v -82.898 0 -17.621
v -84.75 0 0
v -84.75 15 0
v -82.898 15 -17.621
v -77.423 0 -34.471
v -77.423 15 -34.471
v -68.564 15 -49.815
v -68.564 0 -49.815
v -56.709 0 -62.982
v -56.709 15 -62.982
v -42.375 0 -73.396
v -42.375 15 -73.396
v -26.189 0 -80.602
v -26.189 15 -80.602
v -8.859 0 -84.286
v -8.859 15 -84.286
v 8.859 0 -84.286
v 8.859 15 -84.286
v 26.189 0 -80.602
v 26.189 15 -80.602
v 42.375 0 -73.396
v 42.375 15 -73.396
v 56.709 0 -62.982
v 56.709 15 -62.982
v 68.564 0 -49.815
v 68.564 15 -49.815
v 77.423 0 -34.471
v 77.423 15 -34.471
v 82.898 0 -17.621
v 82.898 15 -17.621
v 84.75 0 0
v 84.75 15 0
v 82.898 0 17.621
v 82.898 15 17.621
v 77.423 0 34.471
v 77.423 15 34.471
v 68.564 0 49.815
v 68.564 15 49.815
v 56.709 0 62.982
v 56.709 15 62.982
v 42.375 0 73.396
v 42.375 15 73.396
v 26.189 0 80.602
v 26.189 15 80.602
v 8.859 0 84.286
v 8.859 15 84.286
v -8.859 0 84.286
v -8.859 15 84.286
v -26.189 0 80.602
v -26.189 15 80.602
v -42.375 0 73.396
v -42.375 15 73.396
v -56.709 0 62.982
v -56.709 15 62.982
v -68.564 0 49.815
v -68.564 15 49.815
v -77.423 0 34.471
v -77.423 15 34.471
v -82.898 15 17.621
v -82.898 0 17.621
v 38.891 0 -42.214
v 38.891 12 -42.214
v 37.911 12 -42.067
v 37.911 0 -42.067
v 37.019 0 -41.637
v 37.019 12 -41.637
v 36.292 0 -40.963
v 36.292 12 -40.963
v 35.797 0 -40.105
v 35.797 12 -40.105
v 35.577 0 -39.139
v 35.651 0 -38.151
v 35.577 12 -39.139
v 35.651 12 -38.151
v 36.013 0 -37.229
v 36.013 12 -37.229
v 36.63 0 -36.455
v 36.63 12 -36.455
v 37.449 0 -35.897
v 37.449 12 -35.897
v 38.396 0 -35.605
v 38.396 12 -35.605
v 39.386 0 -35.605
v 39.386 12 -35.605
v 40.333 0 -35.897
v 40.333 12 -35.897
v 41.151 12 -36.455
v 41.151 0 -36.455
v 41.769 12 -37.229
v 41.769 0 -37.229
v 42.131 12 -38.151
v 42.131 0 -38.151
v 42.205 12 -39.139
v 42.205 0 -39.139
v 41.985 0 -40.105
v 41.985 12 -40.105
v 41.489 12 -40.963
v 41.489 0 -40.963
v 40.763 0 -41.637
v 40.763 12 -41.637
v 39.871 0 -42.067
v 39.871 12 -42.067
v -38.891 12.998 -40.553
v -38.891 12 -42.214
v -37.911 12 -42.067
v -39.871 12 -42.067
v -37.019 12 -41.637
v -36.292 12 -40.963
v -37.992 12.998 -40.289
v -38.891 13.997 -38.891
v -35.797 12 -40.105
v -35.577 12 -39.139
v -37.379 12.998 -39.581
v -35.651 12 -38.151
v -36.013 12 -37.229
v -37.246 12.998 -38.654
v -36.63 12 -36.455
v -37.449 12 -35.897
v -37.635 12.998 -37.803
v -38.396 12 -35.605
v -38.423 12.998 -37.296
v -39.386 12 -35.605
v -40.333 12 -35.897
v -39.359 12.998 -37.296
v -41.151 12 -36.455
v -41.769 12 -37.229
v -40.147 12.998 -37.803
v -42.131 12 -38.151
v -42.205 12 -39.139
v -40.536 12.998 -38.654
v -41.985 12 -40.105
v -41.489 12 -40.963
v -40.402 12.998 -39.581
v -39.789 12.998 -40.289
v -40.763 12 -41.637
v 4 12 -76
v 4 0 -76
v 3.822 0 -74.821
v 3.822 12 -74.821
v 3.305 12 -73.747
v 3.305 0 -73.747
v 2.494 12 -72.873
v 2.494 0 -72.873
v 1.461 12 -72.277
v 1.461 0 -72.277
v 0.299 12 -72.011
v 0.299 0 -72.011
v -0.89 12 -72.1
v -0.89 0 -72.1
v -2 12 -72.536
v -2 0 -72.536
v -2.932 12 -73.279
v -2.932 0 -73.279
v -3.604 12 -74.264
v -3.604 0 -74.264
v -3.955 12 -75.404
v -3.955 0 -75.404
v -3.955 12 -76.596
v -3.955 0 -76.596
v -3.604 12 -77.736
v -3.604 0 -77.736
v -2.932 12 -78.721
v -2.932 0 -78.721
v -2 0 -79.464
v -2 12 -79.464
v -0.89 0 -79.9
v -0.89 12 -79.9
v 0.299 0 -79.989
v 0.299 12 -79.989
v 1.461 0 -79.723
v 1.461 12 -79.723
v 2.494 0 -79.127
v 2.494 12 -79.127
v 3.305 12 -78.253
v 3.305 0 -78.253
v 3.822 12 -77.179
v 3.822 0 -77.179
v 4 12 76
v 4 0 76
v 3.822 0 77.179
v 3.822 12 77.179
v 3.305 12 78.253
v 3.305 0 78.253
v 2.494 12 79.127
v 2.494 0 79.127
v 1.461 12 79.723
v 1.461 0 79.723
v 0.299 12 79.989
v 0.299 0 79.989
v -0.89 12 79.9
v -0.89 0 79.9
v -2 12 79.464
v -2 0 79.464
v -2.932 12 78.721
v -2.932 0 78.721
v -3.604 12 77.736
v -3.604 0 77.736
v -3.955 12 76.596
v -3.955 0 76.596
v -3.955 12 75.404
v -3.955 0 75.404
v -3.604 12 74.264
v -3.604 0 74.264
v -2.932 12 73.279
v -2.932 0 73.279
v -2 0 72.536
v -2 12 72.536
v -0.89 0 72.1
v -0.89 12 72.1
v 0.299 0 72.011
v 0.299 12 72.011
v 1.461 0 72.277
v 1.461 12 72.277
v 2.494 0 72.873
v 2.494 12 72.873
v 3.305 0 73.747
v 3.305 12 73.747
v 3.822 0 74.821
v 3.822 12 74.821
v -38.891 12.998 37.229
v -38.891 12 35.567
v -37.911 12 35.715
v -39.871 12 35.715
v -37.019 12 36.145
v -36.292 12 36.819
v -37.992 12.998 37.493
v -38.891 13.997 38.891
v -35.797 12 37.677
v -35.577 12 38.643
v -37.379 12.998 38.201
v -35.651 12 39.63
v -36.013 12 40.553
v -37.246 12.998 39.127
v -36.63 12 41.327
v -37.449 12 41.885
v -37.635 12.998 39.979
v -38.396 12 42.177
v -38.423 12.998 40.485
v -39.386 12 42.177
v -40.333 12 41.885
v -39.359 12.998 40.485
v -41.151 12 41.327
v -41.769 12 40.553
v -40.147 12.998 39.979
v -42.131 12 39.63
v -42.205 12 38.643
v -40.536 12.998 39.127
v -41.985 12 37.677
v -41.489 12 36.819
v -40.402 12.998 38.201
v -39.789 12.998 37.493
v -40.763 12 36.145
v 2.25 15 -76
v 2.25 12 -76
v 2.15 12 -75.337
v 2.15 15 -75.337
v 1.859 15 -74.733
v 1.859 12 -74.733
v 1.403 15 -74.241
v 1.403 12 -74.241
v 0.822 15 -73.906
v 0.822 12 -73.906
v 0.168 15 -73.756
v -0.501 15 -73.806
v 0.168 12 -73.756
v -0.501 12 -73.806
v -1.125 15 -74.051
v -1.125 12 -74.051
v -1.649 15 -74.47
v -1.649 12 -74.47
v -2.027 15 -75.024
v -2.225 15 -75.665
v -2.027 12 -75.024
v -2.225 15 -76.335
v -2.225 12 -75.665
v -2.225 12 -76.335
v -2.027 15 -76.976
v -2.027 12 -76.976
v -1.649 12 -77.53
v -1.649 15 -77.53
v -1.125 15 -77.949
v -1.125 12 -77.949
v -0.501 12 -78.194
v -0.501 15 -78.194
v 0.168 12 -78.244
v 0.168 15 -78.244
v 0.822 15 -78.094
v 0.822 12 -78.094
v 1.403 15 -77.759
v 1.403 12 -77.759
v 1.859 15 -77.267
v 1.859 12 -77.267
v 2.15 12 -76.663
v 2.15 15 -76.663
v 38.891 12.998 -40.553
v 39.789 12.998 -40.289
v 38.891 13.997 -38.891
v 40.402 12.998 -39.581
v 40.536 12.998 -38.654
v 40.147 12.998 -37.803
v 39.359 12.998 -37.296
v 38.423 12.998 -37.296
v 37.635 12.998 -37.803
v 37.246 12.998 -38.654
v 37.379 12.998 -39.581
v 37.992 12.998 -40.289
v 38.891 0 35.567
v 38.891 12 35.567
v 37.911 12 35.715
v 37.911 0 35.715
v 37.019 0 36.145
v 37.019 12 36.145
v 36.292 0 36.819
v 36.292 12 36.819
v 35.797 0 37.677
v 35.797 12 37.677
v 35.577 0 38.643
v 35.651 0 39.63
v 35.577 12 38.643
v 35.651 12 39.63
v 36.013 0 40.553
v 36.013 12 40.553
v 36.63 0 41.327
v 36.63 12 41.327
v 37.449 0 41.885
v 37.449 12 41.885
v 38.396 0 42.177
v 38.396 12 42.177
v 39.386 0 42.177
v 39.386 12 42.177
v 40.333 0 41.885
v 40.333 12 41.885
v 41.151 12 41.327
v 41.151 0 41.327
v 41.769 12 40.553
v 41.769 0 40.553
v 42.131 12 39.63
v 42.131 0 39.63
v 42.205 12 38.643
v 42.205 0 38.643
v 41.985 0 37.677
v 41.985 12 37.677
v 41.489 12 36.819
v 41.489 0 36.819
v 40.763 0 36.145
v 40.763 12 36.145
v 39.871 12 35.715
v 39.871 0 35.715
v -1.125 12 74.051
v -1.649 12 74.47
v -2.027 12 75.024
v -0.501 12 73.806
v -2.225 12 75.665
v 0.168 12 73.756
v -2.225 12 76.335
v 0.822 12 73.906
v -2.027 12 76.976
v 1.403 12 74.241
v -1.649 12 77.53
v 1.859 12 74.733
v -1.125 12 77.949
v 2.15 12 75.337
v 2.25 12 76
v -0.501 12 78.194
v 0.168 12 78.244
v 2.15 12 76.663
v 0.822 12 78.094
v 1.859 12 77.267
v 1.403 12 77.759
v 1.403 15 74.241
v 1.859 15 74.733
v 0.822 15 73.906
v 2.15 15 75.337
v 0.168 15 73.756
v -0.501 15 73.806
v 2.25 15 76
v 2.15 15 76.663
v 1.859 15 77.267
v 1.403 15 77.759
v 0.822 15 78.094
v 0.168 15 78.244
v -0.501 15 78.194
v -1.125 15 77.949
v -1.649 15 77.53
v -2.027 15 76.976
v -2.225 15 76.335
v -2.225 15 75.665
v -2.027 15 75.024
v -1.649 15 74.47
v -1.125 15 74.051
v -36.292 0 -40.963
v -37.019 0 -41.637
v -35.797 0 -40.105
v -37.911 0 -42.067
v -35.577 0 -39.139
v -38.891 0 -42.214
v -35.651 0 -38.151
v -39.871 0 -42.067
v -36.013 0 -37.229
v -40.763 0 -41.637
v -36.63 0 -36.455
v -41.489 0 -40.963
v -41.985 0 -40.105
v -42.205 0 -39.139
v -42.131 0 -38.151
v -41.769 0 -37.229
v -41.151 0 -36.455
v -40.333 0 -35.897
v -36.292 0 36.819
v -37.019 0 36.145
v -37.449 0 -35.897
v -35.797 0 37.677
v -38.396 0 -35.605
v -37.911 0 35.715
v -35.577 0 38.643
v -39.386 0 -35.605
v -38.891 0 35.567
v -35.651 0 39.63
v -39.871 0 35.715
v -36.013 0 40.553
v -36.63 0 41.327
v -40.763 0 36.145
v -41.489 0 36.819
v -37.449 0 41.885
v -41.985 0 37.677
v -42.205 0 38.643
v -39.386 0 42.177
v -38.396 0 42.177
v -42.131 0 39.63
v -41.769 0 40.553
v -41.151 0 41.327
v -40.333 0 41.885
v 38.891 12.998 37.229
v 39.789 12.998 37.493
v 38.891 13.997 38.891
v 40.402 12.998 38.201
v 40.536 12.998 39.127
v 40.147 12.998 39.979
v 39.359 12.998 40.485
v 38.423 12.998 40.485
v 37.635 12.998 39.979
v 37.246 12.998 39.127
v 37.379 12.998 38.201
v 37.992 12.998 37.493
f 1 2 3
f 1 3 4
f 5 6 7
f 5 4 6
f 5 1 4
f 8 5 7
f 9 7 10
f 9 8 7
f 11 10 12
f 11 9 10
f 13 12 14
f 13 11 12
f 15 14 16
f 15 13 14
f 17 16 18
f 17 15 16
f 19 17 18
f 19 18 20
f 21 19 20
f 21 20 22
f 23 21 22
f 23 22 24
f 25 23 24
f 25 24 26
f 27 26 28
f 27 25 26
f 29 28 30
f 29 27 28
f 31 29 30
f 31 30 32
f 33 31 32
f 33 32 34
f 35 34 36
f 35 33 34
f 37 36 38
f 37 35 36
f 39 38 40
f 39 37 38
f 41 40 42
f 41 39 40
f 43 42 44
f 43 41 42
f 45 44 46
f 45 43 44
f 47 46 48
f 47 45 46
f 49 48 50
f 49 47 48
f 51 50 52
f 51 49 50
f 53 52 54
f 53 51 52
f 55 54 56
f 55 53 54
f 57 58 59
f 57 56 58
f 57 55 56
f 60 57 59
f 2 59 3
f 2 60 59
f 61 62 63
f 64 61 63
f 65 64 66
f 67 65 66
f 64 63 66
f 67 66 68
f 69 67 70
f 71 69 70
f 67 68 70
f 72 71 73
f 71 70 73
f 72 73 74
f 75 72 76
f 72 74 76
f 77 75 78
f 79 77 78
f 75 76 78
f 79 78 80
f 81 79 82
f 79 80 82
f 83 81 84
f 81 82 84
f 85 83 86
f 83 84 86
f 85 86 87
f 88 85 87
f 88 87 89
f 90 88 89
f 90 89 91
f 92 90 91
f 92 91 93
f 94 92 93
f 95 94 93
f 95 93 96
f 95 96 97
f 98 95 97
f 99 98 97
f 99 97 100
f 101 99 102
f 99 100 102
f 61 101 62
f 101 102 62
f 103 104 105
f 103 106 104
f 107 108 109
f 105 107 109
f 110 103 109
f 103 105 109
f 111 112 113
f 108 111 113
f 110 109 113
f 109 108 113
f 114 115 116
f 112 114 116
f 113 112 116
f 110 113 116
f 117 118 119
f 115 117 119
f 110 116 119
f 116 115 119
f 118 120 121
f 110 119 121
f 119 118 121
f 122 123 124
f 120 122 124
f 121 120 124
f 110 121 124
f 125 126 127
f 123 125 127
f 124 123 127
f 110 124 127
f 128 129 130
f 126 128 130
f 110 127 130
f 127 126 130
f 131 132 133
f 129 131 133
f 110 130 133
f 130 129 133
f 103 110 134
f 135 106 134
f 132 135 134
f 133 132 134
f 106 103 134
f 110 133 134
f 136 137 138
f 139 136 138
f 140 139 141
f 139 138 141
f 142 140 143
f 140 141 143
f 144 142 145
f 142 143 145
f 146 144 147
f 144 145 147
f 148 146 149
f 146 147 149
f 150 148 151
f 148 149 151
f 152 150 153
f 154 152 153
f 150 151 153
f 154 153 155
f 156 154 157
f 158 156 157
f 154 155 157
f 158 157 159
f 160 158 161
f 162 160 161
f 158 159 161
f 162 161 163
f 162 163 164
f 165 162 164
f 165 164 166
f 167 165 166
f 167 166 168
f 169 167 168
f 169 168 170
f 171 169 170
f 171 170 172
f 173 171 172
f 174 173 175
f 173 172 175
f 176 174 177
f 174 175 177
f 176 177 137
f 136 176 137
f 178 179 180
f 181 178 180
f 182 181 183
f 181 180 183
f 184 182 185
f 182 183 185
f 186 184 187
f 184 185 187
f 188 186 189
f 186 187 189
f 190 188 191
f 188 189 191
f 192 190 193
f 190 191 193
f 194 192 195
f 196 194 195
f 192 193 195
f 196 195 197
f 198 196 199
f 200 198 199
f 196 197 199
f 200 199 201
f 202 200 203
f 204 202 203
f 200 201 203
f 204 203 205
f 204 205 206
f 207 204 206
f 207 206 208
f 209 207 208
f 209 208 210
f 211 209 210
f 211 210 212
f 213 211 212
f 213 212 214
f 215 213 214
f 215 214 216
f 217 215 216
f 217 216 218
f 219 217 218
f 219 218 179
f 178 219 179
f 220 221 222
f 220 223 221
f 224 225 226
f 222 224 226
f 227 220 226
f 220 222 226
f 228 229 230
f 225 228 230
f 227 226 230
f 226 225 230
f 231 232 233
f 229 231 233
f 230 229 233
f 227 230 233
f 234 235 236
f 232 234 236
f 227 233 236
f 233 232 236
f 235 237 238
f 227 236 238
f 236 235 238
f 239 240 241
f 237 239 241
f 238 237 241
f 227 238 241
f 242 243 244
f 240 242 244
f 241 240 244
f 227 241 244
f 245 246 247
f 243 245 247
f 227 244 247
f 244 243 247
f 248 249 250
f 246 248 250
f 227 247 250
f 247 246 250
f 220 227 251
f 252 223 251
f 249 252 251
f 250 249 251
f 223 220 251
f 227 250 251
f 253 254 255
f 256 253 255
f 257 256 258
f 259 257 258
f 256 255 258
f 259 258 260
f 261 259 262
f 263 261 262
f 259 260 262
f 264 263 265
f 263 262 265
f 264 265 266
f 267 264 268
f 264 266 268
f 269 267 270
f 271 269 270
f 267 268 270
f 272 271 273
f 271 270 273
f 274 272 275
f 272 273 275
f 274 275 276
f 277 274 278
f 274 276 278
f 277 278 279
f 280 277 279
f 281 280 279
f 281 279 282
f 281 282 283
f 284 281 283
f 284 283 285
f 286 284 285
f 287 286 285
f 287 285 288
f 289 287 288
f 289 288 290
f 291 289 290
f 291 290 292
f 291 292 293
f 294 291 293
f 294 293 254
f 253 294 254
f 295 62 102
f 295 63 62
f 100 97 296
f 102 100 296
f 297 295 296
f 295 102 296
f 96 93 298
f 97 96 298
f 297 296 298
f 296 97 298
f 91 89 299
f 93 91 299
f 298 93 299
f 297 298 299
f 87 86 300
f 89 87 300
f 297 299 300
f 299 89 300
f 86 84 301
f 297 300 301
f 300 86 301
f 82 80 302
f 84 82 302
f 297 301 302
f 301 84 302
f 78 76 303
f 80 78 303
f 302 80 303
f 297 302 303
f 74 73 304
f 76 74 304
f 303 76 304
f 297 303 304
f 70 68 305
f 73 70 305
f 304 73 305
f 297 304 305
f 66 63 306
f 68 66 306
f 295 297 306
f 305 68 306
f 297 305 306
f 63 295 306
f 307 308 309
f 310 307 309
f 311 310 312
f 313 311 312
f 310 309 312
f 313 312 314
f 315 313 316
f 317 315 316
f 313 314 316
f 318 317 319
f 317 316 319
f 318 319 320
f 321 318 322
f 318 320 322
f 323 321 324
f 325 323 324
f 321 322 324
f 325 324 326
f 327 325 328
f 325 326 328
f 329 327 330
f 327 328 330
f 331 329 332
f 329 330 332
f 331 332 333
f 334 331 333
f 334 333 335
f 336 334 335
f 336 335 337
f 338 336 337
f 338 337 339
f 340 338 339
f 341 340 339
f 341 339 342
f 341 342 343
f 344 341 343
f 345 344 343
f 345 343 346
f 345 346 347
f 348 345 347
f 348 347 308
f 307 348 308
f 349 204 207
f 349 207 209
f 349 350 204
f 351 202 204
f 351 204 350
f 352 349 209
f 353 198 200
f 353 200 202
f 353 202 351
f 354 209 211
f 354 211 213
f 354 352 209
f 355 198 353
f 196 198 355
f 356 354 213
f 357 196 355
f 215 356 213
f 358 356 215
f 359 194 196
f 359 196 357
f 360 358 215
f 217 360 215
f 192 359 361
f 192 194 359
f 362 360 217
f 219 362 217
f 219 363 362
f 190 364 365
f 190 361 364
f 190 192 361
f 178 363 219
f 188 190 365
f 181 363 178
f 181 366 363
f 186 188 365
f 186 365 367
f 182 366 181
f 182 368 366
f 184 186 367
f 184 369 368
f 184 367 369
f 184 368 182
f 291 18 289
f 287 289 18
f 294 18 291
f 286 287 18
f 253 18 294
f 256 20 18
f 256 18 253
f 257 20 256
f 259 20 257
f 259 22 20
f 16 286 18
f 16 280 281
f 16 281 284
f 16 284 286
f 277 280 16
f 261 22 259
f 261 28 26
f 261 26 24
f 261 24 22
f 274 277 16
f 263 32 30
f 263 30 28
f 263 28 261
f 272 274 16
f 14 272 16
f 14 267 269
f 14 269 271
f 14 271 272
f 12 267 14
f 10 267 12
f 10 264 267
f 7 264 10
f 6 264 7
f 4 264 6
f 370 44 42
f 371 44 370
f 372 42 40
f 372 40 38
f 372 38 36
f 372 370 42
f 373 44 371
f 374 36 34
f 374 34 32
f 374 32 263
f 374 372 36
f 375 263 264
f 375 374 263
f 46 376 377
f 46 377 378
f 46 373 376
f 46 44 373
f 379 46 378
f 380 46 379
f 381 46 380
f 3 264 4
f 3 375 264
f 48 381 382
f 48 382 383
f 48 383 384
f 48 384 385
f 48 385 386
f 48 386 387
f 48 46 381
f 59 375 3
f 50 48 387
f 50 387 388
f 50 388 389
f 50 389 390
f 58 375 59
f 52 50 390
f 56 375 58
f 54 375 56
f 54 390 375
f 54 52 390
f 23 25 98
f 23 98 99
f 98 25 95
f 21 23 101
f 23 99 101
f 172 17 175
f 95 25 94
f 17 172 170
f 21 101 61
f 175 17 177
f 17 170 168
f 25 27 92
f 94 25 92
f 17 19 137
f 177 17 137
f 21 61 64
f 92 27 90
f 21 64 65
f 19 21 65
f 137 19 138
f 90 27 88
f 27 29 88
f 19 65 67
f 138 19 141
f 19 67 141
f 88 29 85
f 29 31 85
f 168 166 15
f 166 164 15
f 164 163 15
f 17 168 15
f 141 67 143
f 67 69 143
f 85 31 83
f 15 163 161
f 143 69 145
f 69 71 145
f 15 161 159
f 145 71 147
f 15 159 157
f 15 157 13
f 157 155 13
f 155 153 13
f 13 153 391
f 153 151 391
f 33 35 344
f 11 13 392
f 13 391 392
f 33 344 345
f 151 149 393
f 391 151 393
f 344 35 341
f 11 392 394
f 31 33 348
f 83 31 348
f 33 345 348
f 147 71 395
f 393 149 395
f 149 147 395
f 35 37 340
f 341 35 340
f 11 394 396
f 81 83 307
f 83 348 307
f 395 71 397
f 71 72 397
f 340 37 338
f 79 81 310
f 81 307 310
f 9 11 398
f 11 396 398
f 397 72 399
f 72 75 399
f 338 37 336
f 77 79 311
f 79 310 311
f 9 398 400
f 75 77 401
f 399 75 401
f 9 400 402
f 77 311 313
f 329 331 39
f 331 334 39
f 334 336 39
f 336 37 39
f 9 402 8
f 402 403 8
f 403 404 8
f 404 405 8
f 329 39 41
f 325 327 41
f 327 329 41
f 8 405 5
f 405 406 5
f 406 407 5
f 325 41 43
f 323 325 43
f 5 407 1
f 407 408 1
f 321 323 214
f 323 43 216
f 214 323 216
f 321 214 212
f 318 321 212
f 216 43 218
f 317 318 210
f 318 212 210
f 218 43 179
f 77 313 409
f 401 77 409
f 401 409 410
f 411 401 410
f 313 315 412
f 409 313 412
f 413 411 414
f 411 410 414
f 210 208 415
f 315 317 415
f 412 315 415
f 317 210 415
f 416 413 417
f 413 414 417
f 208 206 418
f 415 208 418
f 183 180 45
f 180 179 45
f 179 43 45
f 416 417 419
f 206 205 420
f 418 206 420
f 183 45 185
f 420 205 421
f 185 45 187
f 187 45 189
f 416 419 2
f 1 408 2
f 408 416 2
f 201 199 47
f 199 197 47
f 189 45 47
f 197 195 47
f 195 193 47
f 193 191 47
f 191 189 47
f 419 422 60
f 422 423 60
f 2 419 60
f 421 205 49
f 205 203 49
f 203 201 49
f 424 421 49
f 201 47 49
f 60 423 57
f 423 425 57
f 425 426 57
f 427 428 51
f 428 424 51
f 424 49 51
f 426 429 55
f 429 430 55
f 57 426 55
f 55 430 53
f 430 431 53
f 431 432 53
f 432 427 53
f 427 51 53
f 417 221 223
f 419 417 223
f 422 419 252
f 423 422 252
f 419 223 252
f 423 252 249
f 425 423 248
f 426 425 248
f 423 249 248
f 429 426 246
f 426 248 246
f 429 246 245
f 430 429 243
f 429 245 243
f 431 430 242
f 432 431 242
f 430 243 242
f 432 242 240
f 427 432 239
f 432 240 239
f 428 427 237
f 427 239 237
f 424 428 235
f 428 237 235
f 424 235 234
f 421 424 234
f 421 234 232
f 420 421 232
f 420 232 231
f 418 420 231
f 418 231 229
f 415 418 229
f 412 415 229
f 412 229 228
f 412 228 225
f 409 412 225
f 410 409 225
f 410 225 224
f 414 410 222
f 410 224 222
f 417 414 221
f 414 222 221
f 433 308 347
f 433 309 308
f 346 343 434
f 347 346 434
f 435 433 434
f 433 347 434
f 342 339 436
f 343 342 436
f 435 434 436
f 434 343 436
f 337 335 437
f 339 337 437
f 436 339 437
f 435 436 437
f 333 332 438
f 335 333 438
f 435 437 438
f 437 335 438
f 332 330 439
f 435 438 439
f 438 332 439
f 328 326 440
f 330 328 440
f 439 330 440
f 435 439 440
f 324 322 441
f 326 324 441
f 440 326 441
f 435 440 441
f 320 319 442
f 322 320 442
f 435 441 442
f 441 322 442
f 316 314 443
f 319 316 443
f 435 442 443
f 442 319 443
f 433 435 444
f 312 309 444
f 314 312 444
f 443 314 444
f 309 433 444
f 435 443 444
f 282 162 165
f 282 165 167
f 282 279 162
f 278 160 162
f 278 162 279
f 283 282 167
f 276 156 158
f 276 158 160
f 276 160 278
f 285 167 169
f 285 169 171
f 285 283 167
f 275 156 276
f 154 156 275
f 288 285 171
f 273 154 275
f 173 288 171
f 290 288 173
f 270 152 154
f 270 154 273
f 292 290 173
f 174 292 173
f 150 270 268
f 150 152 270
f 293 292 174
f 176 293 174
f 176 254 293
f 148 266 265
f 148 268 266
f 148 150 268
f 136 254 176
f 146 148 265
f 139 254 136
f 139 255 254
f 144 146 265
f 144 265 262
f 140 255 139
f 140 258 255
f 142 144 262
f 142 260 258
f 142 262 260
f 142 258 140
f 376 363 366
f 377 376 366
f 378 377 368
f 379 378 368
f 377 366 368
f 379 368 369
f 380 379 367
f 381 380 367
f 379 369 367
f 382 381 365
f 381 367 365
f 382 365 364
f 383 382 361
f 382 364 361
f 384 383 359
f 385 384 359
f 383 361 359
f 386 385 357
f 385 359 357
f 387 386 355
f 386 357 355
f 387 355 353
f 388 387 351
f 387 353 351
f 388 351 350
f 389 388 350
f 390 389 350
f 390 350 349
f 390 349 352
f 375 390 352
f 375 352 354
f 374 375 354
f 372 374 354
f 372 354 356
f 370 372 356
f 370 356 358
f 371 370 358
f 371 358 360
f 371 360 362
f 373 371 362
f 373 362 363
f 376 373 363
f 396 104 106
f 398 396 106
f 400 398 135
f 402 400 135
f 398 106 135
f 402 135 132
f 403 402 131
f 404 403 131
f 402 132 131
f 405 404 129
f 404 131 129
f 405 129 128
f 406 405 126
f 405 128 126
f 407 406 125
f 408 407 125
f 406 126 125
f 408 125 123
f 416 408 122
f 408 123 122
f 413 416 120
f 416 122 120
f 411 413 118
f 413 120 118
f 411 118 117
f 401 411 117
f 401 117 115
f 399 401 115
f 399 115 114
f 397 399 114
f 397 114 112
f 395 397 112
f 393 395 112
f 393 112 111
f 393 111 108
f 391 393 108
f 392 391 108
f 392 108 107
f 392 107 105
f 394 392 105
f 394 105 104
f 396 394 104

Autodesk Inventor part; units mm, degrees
ref_plane "YZ Plane" through (0, 0, 0) normal (1, 0, 0) x (0, 1, 0)
ref_plane "XZ Plane" through (0, 0, 0) normal (0, 1, 0) x (-1, 0, 0)
ref_plane "XY Plane" through (0, 0, 0) normal (0, 0, 1) x (1, 0, 0)
sketch "Sketch1" plane through (0, 0, 0) normal (0, 1, 0) x (-1, 0, 0)
  circle A0 centre (0, 0) radius 84.75
  dimension "d0" = 169.5
extrude "Extrusion1" add sketch "Sketch1" along normal blind 15
sketch "Sketch2" plane through (0, 0, 0) normal (0, -1, 0) x (1, 0, 0)
  circle A0 centre (0, 0) radius 76
  circle A1 centre (0, 76) radius 4
  circle A2 centre (0, -76) radius 4
  circle A3 centre (0, 76) radius 2.25
  circle A4 centre (0, -76) radius 2.25
  dimension "d3" = 152
  dimension "d4" = 8
  dimension "d5" = 8
  dimension "d6" = 4.5
  dimension "d7" = 4.5
extrude "Extrusion2" cut sketch "Sketch2" against normal through all contours A3 A0 | A0 A3 | A4 A0 | A0 A4
extrude "Extrusion3" cut sketch "Sketch2" against normal blind 12 contours A1 A0 A3 | A0 A3 A1 | A2 A0 A4 | A0 A4 A2 | A3 A0 | A0 A3 | A4 A0 | A0 A4
sketch "Sketch3" plane through (0, 0, 0) normal (0, -1, 0) x (1, 0, 0)
  circle A0 centre (0, 0) radius 84.75
  circle A1 centre (0, 0) radius 20
  circle A2 centre (0, -20) radius 4
  circle A3 centre (20, 0) radius 4
  circle A4 centre (0, 20) radius 4
  circle A5 centre (-20, 0) radius 4
  line L0 (55, 55) -> (-55, 55)
  line L1 (-55, 55) -> (-55, -55)
  line L2 (-55, -55) -> (55, -55)
  line L3 (55, -55) -> (55, 55)
  line L4 (55, 55) -> (-55, -55) construction
  line L5 (-55, 55) -> (55, -55) construction
  circle A6 centre (0, 0) radius 55
  circle A7 centre (-38.8909, -38.8909) radius 4
  circle A8 centre (38.8909, -38.8909) radius 4
  circle A9 centre (38.8909, 38.8909) radius 4
  circle A10 centre (-38.8909, 38.8909) radius 4
  dimension "d12" = 40
  dimension "d13" = 8
  dimension "d16" = 360
  dimension "d21" = 110
  dimension "d22" = 110
  dimension "d23" = 110
  dimension "d24" = 8
  dimension "d25" = 8
  dimension "d26" = 8
  dimension "d27" = 8
hole "Hole1" at (38.8909, 0, -38.8909) at (38.8909, 0, 38.8909) at (-38.8909, 0, 38.8909) at (-38.8909, 0, -38.8909) direction (0, 1, 0) diameter 6.647 depth 12 tip angle 118 thread size "M8x1.25" class "6H" standard "ANSI Metric M Profile"
properties part number "Modified Substrate Plate Top"
